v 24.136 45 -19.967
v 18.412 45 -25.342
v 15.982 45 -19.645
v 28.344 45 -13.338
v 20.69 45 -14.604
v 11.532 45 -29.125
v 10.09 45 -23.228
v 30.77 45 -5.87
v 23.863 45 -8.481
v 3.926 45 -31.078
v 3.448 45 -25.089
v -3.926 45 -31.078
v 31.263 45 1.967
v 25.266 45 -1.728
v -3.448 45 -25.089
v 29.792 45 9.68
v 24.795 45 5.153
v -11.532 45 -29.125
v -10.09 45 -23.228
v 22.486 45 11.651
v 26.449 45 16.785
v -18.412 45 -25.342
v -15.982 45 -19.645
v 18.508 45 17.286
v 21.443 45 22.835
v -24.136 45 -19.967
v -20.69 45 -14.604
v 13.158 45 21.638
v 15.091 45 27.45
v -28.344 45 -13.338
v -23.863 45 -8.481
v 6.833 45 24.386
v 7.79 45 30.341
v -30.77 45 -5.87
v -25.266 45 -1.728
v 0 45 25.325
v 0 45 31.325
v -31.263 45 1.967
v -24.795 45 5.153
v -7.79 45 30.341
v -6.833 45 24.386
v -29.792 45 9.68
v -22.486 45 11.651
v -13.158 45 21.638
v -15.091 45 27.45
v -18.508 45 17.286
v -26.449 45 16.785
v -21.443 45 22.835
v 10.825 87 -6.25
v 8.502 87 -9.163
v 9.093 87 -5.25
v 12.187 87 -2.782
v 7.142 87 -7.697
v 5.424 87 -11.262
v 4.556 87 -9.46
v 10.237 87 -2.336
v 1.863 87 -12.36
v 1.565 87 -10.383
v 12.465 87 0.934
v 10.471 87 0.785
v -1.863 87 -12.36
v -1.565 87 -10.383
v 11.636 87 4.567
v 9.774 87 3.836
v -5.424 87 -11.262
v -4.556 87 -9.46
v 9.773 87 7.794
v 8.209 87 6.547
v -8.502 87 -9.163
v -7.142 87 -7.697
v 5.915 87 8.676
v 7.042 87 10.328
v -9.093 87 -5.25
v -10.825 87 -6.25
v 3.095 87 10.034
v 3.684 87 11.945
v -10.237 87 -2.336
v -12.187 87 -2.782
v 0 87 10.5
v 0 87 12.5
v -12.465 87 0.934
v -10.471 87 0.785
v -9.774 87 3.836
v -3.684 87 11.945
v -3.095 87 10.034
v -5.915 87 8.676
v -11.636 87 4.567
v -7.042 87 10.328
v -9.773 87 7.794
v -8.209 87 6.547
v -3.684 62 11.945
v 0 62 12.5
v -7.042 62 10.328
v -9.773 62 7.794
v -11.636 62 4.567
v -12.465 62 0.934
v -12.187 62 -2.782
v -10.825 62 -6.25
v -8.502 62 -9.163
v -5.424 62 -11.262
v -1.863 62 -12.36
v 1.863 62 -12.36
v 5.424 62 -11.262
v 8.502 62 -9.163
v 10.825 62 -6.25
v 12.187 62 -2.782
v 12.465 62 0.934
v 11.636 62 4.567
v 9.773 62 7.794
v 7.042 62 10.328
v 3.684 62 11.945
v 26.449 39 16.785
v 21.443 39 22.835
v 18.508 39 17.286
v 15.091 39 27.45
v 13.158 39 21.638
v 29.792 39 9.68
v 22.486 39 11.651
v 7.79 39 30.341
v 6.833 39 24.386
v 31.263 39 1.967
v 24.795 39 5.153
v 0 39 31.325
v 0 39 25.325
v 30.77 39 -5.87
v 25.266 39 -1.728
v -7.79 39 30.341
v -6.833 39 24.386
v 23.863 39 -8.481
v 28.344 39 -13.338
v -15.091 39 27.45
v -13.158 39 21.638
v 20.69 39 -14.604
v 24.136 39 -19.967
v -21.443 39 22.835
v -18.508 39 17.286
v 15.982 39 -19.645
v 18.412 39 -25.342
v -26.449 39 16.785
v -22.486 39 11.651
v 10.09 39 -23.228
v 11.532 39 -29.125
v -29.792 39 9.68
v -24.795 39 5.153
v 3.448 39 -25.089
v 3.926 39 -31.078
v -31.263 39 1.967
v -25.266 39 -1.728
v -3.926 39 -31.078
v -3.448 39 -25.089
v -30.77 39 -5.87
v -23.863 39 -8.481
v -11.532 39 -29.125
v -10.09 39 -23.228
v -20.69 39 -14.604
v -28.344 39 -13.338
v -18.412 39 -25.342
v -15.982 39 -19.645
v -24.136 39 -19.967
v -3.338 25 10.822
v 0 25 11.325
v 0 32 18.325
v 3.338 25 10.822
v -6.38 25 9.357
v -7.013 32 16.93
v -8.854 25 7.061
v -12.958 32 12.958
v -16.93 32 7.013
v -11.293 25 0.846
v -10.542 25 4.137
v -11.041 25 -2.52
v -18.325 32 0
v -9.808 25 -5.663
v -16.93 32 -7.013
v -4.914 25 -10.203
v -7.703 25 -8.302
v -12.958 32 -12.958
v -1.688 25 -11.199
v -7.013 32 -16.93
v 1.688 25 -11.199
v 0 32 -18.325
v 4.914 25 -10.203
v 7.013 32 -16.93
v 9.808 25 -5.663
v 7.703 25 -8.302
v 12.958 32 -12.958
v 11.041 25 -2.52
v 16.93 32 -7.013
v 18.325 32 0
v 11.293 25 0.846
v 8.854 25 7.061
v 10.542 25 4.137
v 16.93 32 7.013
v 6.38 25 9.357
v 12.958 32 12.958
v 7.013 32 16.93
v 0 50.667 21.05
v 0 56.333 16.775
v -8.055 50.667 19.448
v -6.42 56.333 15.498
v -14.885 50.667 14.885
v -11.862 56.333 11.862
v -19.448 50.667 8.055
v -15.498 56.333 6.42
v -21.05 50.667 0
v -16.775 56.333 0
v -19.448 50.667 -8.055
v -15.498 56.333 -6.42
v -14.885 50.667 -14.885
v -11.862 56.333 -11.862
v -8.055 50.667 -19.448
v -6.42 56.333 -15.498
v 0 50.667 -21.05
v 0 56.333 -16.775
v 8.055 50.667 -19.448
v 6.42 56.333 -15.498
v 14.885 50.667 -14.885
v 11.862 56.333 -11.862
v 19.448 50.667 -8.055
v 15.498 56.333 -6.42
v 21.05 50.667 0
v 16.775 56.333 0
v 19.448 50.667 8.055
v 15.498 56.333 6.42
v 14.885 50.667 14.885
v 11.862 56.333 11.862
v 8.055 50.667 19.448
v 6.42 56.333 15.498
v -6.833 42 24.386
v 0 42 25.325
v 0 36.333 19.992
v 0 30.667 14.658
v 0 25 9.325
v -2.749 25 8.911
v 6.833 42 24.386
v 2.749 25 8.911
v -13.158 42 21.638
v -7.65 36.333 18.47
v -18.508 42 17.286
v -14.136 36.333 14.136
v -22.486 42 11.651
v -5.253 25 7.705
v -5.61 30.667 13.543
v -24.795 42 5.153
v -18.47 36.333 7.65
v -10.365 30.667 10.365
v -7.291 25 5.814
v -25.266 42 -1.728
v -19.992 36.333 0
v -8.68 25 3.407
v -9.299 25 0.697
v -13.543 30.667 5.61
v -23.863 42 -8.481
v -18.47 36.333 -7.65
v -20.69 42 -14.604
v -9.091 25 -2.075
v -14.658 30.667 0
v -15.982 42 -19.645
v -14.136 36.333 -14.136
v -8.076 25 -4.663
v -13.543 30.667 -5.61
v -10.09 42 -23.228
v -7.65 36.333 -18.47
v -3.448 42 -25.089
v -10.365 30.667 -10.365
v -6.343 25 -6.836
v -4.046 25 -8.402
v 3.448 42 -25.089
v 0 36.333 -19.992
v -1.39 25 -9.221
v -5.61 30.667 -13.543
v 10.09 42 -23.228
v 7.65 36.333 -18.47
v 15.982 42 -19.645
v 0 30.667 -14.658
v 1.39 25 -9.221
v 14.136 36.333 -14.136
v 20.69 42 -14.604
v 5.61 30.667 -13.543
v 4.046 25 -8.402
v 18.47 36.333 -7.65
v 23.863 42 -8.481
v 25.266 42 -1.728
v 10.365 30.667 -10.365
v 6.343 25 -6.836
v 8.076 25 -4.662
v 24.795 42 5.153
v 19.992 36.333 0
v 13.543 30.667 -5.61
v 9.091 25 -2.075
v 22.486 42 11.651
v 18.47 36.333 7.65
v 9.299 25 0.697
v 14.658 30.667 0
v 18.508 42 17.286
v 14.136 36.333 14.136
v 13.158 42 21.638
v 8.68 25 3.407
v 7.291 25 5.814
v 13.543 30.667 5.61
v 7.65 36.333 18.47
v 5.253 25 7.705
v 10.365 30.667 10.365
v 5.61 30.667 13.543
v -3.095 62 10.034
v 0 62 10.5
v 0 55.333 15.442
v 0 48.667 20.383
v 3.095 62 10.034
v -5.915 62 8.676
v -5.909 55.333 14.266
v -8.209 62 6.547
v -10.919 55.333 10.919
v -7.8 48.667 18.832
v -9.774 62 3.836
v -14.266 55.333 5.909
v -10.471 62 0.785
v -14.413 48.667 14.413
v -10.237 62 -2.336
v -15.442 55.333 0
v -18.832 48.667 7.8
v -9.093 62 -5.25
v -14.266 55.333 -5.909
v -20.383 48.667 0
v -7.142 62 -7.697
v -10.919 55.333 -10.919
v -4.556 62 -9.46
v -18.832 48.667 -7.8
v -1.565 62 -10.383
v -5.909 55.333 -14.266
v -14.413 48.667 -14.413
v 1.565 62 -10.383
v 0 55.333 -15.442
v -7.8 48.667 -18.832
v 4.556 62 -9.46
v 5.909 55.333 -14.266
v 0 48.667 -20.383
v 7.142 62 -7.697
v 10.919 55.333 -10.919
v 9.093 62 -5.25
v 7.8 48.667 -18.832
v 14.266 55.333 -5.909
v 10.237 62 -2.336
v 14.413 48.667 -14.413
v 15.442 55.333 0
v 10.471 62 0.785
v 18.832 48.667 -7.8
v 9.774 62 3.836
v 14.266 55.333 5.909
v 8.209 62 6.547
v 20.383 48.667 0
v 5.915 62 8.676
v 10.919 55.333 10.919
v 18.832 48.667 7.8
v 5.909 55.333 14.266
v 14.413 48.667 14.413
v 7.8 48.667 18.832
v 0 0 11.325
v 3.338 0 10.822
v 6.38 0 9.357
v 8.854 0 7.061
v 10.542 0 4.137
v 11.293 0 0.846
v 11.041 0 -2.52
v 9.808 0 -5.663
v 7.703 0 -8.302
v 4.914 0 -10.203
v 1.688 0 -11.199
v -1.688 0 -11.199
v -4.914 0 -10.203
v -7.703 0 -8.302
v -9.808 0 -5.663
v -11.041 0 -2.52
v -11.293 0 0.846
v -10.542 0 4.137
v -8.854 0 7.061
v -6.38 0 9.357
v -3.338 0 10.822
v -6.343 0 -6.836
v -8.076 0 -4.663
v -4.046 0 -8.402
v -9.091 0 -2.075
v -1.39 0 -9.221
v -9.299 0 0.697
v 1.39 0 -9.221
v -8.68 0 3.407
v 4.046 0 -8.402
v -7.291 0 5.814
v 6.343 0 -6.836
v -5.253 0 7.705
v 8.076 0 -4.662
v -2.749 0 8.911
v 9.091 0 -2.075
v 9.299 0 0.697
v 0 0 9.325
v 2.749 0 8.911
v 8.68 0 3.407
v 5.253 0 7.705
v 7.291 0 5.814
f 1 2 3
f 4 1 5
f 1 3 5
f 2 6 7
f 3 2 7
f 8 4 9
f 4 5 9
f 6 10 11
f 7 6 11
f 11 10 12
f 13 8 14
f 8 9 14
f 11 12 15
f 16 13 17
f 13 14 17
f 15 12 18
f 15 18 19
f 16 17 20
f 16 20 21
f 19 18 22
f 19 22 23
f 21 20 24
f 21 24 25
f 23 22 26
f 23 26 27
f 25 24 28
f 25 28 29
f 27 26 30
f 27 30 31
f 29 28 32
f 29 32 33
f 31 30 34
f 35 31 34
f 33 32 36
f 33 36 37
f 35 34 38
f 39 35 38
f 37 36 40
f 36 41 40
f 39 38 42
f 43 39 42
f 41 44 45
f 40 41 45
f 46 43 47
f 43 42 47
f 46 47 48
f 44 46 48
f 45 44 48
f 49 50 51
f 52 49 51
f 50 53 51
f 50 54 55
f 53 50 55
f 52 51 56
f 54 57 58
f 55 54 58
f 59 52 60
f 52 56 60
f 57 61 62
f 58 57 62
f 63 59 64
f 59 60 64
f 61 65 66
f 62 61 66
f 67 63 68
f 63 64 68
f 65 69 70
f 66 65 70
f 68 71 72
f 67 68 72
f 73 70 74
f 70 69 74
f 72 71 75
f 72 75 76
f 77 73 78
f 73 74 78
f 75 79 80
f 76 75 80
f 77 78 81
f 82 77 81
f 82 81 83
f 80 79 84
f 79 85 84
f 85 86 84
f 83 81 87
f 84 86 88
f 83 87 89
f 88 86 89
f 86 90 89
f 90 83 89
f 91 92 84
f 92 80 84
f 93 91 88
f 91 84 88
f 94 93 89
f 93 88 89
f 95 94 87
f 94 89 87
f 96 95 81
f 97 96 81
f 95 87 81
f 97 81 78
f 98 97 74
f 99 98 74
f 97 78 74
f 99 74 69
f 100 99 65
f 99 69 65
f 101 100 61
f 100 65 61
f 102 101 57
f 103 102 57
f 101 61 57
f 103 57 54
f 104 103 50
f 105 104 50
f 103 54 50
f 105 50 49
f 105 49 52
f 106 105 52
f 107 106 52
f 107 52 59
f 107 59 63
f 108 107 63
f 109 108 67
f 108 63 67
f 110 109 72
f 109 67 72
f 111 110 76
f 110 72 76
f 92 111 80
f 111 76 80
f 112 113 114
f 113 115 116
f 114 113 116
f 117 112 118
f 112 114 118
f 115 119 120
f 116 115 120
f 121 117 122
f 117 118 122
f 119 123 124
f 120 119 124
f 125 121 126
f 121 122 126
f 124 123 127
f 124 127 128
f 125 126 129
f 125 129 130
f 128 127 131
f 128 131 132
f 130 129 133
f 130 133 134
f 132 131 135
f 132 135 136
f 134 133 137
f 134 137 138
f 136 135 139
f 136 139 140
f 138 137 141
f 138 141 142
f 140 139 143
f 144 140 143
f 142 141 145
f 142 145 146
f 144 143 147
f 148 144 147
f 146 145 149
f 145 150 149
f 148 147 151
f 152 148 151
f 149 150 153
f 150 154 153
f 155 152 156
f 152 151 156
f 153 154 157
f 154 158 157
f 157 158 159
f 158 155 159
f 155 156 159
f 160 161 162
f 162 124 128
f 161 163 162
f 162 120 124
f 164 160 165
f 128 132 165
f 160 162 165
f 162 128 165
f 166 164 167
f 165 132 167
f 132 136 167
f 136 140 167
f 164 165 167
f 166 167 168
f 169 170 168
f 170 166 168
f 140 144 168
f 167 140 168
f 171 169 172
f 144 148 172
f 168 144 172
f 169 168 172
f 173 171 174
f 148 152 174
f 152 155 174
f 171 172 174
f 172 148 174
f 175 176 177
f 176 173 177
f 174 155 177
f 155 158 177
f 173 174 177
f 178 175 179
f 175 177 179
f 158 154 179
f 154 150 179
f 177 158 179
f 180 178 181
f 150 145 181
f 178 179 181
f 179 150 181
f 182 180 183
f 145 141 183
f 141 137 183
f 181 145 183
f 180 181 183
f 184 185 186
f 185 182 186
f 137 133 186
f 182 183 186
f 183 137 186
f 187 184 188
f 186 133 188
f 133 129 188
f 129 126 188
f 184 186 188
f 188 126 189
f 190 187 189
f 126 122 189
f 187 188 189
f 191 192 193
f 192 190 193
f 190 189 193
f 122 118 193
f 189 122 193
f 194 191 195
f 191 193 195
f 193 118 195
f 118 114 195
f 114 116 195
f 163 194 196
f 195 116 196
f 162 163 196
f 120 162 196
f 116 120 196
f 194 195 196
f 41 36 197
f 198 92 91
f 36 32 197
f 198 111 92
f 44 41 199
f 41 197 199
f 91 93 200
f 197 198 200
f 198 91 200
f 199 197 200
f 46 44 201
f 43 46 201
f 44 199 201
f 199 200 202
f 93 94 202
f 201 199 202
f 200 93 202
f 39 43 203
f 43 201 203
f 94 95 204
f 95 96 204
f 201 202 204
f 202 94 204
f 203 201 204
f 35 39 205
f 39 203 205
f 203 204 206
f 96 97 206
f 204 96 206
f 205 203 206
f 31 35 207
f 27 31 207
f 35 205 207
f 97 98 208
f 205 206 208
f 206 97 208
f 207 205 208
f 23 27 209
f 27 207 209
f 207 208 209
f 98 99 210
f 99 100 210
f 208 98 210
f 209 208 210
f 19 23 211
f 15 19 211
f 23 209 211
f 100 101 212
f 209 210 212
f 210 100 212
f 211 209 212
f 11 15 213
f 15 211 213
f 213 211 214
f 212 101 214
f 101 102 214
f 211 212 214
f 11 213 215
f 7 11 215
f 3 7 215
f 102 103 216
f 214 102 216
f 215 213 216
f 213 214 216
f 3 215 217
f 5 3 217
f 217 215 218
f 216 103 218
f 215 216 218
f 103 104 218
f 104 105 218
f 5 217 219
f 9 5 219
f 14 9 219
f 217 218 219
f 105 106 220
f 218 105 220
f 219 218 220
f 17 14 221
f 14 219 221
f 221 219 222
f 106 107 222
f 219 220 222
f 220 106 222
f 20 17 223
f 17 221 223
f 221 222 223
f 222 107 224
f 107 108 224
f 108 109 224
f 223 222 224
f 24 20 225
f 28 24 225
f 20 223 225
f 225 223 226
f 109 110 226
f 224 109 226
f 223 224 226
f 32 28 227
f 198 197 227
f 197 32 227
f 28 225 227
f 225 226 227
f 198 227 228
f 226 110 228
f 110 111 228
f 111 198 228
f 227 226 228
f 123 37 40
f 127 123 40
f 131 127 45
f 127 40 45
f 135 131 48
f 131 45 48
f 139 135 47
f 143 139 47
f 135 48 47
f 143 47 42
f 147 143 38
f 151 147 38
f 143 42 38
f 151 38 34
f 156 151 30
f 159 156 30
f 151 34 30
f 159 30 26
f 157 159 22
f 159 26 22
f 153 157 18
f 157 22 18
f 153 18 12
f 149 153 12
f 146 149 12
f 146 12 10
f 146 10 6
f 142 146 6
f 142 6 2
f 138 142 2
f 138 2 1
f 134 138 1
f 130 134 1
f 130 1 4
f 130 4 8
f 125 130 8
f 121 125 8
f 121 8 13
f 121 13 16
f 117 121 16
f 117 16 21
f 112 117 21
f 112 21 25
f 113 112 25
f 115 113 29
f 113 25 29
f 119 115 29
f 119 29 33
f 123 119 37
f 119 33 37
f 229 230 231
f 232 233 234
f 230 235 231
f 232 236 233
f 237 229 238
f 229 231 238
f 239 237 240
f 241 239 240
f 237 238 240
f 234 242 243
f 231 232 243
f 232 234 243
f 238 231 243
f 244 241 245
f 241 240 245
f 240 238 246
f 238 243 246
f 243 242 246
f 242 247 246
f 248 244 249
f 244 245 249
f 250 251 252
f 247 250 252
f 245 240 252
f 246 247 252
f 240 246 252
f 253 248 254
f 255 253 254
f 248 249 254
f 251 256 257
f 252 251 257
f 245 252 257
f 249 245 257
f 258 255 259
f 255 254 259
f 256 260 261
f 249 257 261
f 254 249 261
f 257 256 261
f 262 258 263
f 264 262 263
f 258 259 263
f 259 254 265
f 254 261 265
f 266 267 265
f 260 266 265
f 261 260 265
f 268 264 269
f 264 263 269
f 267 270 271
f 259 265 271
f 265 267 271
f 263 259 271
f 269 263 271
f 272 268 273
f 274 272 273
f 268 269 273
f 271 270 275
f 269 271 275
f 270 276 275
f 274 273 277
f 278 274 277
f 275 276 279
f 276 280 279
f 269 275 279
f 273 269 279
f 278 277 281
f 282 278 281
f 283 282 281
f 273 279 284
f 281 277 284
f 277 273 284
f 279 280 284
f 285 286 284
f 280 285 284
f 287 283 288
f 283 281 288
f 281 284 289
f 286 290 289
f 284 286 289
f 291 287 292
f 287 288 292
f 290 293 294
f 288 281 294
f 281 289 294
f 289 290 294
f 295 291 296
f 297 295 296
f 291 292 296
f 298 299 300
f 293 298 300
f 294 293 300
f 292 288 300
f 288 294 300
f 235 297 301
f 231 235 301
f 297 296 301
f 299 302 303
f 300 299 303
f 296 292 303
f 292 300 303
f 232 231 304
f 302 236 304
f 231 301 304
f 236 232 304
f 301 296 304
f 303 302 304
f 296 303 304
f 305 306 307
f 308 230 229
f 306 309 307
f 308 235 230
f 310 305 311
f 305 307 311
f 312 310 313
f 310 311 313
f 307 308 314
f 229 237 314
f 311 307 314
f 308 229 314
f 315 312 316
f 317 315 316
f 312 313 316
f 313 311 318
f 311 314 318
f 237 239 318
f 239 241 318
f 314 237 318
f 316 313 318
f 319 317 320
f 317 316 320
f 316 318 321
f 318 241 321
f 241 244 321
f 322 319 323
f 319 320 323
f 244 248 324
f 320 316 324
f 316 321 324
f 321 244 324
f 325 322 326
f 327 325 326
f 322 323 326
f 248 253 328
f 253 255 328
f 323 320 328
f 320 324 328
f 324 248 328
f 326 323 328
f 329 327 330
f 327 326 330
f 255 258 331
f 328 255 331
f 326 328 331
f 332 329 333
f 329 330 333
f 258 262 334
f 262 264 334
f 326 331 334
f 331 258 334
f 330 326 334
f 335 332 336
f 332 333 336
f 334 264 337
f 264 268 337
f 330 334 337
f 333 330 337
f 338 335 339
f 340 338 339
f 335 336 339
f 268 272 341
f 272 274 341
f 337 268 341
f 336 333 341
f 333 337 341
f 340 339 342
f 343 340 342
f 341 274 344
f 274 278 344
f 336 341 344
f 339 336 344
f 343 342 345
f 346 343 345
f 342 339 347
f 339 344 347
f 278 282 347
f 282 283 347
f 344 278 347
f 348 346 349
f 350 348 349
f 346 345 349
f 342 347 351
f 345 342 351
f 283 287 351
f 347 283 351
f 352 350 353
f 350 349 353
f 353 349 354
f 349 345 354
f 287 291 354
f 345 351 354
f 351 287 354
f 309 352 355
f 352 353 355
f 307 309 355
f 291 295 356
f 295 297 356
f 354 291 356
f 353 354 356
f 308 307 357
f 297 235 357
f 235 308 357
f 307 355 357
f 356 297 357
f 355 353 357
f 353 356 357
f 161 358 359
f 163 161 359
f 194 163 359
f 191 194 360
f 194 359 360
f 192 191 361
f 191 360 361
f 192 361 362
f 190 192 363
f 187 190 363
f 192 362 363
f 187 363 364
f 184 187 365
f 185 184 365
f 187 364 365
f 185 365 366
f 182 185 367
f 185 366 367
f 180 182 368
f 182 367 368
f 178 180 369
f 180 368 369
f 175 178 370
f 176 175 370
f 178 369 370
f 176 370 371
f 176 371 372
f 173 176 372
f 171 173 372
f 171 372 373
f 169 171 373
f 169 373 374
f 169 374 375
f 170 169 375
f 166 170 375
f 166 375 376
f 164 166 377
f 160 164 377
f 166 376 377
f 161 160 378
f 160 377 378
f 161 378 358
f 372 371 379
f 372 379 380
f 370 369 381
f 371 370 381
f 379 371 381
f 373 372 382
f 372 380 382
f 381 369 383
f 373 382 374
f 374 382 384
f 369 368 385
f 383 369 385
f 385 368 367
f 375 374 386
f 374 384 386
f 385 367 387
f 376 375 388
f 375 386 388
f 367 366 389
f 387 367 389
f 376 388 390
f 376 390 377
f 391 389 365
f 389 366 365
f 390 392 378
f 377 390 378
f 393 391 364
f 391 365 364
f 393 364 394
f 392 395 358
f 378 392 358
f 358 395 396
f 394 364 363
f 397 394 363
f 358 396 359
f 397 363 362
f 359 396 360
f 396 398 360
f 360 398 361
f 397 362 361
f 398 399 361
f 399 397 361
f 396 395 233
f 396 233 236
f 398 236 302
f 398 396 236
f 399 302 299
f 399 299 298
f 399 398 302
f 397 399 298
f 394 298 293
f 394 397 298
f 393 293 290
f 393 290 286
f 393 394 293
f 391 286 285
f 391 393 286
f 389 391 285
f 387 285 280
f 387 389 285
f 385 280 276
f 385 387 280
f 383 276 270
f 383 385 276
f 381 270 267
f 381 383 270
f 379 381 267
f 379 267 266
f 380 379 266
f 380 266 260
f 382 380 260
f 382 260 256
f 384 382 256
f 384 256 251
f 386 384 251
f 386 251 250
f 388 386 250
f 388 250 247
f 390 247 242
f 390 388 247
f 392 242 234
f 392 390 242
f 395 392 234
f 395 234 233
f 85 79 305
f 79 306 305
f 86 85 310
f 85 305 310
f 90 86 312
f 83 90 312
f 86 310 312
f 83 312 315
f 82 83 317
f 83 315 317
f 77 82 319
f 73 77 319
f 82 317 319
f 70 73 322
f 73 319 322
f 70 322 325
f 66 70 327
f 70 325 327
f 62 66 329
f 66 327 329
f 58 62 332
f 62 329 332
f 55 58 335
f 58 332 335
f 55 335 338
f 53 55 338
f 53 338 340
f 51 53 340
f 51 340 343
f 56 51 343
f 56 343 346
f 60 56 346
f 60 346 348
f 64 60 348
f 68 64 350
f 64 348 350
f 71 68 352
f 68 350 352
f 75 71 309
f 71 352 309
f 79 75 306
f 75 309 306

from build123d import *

# Parameters (mm, degrees)
SKETCH1_R           = 11.325
SKETCH1_R_2         = 9.325
BOSS_EXTRUDE1_DEPTH = 25


with BuildPart() as part:
    # Sketch1 → Boss-Extrude1 (new body)
    with BuildSketch(Plane(origin=(0, 0, 0), x_dir=(1, 0, 0), z_dir=(0, 1, 0))):
        with Locations(Location((0, 0, 0), (0, 0, 270))):
            Circle(SKETCH1_R)
        with Locations(Location((0, 0, 0), (0, 0, 270))):
            Circle(SKETCH1_R_2, mode=Mode.SUBTRACT)
    extrude(amount=BOSS_EXTRUDE1_DEPTH)

    # Sketch10 → Revolve1 (revolve)
    with BuildSketch(Plane.XY, mode=Mode.PRIVATE) as revolve1_sk:
        Polygon((-11.325, 25), (-25.325, 39), (-31.325, 39), (-31.325, 42), (-25.325, 42), (-9.325, 25), align=None)
    revolve(revolve1_sk.sketch.rotate(Axis((0, 25, 0), (0, -1, 0)), 270), axis=Axis((0, 25, 0), (0, -1, 0)))

    # Sketch11 → Revolve2 (revolve)
    with BuildSketch(Plane.XY, mode=Mode.PRIVATE) as revolve2_sk:
        Polygon((-31.325, 42), (-31.325, 45), (-25.325, 45), (-12.5, 62), (-12.5, 87), (-10.5, 87), (-10.5, 62), (-25.325, 42), align=None)
    revolve(revolve2_sk.sketch.rotate(Axis((0, 25, 0), (0, -1, 0)), 270), axis=Axis((0, 25, 0), (0, -1, 0)))


solid = part.part
